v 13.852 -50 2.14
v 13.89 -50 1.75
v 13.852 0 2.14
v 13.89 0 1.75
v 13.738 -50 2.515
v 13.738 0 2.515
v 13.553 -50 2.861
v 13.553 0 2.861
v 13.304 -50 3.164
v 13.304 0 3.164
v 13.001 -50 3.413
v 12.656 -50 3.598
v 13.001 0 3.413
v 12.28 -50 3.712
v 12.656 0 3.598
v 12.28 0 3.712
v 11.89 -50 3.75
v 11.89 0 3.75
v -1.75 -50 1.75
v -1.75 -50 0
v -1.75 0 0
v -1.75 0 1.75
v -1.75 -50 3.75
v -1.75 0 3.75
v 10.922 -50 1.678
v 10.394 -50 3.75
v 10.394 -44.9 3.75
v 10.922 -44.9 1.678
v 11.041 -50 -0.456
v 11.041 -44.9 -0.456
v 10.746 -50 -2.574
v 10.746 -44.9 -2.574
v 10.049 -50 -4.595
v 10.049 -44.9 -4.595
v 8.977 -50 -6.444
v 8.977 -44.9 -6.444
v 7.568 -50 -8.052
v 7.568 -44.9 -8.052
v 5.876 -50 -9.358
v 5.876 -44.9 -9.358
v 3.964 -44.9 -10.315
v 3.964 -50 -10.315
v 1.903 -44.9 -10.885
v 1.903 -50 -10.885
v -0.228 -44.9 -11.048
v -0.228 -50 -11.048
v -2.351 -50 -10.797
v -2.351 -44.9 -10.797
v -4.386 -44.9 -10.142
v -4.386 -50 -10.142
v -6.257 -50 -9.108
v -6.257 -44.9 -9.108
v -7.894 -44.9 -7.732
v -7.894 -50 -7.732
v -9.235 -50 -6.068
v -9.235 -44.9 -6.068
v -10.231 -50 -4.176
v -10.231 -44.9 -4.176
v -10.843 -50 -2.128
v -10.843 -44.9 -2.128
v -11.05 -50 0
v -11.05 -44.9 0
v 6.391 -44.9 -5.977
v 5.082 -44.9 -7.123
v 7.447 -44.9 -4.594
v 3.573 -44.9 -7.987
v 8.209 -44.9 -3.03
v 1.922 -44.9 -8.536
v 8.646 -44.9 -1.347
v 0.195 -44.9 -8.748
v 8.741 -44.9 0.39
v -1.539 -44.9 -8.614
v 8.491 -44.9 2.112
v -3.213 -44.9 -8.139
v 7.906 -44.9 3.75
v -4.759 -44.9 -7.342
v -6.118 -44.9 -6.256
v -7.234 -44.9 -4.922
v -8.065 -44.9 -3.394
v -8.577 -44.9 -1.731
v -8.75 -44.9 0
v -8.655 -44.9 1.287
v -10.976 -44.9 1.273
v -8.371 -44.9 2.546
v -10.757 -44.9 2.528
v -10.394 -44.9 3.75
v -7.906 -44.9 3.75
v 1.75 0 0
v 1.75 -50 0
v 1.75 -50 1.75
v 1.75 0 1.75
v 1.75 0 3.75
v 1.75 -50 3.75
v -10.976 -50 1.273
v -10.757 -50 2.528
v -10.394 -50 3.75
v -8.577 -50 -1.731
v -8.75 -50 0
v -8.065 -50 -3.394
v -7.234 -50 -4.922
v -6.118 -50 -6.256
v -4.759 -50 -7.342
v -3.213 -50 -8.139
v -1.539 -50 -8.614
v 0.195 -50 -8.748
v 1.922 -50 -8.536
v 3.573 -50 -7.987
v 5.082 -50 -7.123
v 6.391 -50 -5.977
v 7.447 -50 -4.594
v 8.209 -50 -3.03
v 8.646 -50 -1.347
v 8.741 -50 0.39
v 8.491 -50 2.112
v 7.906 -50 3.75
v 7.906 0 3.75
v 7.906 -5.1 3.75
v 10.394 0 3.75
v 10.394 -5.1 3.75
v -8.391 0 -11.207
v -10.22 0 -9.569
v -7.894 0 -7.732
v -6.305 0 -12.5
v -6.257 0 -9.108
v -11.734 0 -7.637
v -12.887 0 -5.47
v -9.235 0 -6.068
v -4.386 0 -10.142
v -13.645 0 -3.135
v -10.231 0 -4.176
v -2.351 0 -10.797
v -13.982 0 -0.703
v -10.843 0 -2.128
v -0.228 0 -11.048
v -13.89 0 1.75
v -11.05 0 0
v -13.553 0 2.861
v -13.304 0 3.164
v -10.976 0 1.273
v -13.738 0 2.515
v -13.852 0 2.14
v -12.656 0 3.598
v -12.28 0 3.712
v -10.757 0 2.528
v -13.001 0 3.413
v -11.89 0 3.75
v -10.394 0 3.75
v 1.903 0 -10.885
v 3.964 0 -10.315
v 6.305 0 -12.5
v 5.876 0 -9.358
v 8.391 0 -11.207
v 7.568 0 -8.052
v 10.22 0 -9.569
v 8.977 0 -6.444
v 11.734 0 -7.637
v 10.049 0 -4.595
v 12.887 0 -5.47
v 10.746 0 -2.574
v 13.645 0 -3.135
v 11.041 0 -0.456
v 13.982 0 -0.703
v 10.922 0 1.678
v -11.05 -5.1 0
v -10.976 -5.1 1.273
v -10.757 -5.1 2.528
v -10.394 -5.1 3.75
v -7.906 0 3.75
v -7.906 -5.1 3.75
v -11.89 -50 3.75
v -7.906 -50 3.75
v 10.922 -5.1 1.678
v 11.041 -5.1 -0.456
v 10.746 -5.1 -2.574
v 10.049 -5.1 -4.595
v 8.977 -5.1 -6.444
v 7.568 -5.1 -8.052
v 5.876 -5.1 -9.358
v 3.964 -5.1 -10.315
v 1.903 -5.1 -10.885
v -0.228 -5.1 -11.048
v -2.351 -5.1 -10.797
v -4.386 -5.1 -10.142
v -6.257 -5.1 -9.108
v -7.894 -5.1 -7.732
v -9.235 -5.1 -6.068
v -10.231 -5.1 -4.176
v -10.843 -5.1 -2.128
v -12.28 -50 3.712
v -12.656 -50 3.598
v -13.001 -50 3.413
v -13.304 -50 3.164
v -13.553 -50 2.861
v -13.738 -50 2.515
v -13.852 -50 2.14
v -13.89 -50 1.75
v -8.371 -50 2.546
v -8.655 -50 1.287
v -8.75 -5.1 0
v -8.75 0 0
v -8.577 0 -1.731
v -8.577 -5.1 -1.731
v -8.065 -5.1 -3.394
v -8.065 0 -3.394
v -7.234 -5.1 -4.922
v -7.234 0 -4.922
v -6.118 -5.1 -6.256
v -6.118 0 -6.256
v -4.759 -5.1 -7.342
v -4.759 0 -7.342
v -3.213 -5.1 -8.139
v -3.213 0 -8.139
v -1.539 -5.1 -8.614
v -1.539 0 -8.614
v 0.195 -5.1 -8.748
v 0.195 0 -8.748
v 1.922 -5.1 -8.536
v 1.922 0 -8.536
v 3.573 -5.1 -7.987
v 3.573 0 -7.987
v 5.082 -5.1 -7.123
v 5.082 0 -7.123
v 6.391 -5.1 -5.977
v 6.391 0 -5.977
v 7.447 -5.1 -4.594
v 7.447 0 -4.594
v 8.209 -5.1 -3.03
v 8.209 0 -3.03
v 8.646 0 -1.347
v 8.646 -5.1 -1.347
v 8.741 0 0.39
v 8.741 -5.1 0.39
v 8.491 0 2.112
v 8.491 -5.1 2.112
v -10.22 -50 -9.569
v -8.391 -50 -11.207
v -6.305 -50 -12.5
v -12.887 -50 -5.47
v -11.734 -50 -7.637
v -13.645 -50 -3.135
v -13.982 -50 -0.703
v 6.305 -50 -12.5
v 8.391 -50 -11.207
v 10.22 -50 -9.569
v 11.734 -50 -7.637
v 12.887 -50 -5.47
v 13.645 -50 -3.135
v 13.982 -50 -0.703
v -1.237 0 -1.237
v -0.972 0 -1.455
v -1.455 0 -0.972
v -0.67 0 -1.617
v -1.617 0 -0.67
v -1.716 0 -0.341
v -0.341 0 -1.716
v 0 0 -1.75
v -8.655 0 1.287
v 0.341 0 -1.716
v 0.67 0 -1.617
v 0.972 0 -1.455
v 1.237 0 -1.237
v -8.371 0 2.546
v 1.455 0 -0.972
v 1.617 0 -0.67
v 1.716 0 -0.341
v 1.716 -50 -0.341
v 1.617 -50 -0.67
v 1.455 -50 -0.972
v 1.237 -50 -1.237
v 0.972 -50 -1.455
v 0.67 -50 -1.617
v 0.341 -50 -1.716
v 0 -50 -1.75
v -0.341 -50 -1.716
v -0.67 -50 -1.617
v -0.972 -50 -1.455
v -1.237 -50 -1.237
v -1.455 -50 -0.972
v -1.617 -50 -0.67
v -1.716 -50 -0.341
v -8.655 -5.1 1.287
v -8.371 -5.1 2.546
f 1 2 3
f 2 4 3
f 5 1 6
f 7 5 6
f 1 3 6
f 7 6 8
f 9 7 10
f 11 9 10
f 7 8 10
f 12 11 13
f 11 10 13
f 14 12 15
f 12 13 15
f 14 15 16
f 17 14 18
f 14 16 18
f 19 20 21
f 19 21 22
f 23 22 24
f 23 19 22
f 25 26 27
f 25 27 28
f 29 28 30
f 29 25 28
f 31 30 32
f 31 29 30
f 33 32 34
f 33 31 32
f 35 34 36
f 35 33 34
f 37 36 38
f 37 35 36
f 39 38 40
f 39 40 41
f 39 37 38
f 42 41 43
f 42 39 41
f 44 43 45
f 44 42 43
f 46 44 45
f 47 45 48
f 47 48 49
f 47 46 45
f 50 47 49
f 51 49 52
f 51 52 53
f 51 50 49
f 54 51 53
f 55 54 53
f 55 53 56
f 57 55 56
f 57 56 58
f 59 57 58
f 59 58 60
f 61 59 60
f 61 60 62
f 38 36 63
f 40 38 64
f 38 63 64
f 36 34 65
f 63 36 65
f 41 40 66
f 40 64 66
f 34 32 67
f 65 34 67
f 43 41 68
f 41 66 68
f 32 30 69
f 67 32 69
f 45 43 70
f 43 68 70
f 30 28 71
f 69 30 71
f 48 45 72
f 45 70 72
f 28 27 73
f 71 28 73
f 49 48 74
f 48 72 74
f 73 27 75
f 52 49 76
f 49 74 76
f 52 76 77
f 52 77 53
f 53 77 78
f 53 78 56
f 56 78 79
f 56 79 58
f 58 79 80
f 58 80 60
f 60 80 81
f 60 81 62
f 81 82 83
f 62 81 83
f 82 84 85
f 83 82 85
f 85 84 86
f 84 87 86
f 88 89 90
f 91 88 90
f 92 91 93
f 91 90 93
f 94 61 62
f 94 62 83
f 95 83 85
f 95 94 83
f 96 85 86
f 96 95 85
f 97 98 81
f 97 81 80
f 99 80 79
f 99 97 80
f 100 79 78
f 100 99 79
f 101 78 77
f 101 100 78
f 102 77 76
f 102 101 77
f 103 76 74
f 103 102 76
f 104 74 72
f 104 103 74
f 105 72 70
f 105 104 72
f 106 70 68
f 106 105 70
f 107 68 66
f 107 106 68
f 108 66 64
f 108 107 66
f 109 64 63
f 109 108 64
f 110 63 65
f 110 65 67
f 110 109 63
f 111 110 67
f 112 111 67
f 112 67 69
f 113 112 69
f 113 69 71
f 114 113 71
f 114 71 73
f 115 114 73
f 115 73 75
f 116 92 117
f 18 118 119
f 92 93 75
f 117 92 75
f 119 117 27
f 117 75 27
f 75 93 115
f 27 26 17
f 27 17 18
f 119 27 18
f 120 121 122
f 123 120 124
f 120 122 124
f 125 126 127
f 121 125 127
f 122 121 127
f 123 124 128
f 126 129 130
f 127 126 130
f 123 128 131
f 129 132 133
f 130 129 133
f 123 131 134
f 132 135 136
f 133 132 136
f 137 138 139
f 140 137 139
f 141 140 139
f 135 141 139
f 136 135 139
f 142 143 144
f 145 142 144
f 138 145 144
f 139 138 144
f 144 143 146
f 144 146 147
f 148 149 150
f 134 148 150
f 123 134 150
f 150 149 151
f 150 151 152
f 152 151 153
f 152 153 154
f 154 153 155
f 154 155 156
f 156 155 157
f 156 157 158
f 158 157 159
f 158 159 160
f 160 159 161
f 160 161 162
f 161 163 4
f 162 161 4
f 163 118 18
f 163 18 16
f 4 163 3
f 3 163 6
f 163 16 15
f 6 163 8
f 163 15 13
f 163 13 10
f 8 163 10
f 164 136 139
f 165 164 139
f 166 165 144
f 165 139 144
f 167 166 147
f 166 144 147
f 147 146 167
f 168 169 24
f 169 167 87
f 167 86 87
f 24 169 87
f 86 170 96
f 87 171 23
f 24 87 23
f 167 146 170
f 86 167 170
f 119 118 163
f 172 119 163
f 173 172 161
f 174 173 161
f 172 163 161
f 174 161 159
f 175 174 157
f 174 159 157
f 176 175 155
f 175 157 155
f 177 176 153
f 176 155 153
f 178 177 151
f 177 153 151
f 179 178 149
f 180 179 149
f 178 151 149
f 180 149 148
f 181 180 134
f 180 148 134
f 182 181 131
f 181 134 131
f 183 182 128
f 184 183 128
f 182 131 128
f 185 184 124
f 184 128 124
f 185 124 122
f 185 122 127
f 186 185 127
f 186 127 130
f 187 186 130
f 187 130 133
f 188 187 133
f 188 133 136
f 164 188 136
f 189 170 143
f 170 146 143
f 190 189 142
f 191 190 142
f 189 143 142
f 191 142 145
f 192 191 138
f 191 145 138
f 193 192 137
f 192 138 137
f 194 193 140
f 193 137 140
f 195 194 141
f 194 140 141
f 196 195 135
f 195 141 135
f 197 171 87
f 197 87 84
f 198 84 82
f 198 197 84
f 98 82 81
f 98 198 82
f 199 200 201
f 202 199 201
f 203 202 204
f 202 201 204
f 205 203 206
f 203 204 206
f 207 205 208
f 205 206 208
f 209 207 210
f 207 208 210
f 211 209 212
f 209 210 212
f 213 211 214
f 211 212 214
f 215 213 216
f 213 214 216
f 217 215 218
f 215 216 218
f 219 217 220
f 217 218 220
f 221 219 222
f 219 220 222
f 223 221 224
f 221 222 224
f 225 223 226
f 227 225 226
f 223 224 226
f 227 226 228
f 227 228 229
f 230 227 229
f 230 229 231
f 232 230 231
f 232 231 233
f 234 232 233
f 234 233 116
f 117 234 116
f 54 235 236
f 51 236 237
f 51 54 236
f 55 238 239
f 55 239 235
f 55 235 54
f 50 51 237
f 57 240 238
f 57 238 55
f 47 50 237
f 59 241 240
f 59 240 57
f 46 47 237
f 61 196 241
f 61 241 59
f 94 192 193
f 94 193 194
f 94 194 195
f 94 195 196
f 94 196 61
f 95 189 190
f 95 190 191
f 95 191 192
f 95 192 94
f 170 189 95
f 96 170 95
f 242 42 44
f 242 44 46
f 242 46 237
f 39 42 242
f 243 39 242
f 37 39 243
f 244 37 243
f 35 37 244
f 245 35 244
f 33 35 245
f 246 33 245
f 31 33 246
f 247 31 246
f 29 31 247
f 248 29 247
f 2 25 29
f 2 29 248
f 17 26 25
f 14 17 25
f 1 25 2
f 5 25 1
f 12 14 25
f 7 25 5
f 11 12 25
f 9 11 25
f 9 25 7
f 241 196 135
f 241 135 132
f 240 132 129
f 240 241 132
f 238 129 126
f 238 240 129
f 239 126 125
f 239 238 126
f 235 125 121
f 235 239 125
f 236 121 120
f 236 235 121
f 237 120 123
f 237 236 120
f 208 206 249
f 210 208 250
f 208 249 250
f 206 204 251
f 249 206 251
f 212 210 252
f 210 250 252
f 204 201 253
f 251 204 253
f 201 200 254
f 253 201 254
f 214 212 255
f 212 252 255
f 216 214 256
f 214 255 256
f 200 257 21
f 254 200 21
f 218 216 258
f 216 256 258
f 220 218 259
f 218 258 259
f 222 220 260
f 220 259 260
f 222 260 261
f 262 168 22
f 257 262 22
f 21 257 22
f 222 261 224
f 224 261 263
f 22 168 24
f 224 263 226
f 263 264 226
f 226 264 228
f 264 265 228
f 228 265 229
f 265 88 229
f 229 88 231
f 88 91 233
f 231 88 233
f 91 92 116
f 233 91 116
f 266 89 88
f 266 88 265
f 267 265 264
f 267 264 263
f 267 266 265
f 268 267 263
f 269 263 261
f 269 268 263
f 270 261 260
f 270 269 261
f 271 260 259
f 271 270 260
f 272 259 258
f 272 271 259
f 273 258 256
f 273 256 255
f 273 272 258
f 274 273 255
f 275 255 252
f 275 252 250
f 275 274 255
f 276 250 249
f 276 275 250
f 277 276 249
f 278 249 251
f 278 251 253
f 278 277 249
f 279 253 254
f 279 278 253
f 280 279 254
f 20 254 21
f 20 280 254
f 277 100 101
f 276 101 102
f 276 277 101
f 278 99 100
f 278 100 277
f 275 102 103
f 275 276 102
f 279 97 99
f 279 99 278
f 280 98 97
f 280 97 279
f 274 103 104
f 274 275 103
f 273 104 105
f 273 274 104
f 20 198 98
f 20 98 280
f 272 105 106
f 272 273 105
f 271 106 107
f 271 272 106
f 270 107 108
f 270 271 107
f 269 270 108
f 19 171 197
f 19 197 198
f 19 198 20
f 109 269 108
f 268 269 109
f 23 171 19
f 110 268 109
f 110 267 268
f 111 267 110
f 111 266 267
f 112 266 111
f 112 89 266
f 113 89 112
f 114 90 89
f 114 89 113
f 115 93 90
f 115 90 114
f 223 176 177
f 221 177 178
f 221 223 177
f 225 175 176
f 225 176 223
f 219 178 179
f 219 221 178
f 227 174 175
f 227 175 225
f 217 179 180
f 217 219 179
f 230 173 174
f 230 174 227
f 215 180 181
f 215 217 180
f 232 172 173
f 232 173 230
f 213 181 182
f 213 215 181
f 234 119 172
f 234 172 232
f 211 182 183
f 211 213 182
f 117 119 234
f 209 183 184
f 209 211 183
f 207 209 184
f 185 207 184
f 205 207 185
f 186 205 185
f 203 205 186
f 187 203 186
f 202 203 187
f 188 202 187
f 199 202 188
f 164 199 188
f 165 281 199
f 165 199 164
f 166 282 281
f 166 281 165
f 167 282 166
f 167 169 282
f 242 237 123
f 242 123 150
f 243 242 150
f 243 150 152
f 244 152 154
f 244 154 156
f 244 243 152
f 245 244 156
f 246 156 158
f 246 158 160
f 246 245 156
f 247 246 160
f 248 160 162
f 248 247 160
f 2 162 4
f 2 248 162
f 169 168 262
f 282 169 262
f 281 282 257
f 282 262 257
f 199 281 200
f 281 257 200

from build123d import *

# Parameters (mm, degrees)
F0_W     = 12.1401943831
F0_H     = 2
F1_DEPTH = 25
F4_DEPTH = 5.1
F8_R     = 1.99999


# Not quite as in the source:
# - a fillet or chamfer is up to 0.001 mm smaller than in the source, because OpenCascade refuses the exact size


with BuildPart() as f1:
    # F0 (on Front) → F1 (new body)
    with BuildSketch(Plane.XZ):
        with BuildLine():
            Line((-1.75, 1.75), (-13.8901943831, 1.75))
            ThreePointArc((-13.8901943831, 1.75), (-12.3581823788, -6.5783986115), (-6.3047601065, -12.5))
            Line((-6.3047601065, -12.5), (6.3047601065, -12.5))
            ThreePointArc((6.3047601065, -12.5), (12.3581823788, -6.5783986115), (13.8901943831, 1.75))
            Line((13.8901943831, 1.75), (1.75, 1.75))
            Line((1.75, 1.75), (1.75, 0))
            ThreePointArc((1.75, 0), (0, -1.75), (-1.75, 0))
            Line((-1.75, 0), (-1.75, 1.75))
        make_face()
        with Locations((7.8200971915, 2.75)):
            Rectangle(F0_W, F0_H)
        with Locations((-7.8200971915, 2.75)):
            Rectangle(F0_W, F0_H)
    extrude(amount=F1_DEPTH)

    # F3 (on face) → F4 (cut)
    with BuildSketch(Plane(origin=(0, 0, 0), x_dir=(-1, 0, 0), z_dir=(0, 1, 0))):
        with BuildLine():
            ThreePointArc((-10.3942291681, 3.75), (-1.9034531373, -10.8848227433), (11.05, 0))
            ThreePointArc((11.05, 0), (10.8848227433, 1.9034531373), (10.3942291681, 3.75))
            Line((10.3942291681, 3.75), (7.9056941504, 3.75))
            ThreePointArc((7.9056941504, 3.75), (8.5363143047, 1.921936027), (8.75, 0))
            ThreePointArc((8.75, 0), (-1.921936027, -8.5363143047), (-7.9056941504, 3.75))
            Line((-7.9056941504, 3.75), (-10.3942291681, 3.75))
        make_face()
    extrude(amount=-F4_DEPTH, mode=Mode.SUBTRACT)

    # F7: F1 across face


with BuildPart() as f1_1:
    add(f1.part)
    add(f1.part.mirror(Plane(origin=(0, -25, -3.8986050214), x_dir=(1, 0, 0), z_dir=(0, -1, 0))))

    # F8 (radius 2 in the source; OpenCascade refuses exactly that, so slightly less here)
    f8_edges = [f1_1.edges().sort_by_distance(p)[0] for p in [
        (13.890194, -25, 3.75),
        (-13.890194, -25, 3.75),
    ]]
    fillet(f8_edges, radius=F8_R)


solid = f1_1.part
